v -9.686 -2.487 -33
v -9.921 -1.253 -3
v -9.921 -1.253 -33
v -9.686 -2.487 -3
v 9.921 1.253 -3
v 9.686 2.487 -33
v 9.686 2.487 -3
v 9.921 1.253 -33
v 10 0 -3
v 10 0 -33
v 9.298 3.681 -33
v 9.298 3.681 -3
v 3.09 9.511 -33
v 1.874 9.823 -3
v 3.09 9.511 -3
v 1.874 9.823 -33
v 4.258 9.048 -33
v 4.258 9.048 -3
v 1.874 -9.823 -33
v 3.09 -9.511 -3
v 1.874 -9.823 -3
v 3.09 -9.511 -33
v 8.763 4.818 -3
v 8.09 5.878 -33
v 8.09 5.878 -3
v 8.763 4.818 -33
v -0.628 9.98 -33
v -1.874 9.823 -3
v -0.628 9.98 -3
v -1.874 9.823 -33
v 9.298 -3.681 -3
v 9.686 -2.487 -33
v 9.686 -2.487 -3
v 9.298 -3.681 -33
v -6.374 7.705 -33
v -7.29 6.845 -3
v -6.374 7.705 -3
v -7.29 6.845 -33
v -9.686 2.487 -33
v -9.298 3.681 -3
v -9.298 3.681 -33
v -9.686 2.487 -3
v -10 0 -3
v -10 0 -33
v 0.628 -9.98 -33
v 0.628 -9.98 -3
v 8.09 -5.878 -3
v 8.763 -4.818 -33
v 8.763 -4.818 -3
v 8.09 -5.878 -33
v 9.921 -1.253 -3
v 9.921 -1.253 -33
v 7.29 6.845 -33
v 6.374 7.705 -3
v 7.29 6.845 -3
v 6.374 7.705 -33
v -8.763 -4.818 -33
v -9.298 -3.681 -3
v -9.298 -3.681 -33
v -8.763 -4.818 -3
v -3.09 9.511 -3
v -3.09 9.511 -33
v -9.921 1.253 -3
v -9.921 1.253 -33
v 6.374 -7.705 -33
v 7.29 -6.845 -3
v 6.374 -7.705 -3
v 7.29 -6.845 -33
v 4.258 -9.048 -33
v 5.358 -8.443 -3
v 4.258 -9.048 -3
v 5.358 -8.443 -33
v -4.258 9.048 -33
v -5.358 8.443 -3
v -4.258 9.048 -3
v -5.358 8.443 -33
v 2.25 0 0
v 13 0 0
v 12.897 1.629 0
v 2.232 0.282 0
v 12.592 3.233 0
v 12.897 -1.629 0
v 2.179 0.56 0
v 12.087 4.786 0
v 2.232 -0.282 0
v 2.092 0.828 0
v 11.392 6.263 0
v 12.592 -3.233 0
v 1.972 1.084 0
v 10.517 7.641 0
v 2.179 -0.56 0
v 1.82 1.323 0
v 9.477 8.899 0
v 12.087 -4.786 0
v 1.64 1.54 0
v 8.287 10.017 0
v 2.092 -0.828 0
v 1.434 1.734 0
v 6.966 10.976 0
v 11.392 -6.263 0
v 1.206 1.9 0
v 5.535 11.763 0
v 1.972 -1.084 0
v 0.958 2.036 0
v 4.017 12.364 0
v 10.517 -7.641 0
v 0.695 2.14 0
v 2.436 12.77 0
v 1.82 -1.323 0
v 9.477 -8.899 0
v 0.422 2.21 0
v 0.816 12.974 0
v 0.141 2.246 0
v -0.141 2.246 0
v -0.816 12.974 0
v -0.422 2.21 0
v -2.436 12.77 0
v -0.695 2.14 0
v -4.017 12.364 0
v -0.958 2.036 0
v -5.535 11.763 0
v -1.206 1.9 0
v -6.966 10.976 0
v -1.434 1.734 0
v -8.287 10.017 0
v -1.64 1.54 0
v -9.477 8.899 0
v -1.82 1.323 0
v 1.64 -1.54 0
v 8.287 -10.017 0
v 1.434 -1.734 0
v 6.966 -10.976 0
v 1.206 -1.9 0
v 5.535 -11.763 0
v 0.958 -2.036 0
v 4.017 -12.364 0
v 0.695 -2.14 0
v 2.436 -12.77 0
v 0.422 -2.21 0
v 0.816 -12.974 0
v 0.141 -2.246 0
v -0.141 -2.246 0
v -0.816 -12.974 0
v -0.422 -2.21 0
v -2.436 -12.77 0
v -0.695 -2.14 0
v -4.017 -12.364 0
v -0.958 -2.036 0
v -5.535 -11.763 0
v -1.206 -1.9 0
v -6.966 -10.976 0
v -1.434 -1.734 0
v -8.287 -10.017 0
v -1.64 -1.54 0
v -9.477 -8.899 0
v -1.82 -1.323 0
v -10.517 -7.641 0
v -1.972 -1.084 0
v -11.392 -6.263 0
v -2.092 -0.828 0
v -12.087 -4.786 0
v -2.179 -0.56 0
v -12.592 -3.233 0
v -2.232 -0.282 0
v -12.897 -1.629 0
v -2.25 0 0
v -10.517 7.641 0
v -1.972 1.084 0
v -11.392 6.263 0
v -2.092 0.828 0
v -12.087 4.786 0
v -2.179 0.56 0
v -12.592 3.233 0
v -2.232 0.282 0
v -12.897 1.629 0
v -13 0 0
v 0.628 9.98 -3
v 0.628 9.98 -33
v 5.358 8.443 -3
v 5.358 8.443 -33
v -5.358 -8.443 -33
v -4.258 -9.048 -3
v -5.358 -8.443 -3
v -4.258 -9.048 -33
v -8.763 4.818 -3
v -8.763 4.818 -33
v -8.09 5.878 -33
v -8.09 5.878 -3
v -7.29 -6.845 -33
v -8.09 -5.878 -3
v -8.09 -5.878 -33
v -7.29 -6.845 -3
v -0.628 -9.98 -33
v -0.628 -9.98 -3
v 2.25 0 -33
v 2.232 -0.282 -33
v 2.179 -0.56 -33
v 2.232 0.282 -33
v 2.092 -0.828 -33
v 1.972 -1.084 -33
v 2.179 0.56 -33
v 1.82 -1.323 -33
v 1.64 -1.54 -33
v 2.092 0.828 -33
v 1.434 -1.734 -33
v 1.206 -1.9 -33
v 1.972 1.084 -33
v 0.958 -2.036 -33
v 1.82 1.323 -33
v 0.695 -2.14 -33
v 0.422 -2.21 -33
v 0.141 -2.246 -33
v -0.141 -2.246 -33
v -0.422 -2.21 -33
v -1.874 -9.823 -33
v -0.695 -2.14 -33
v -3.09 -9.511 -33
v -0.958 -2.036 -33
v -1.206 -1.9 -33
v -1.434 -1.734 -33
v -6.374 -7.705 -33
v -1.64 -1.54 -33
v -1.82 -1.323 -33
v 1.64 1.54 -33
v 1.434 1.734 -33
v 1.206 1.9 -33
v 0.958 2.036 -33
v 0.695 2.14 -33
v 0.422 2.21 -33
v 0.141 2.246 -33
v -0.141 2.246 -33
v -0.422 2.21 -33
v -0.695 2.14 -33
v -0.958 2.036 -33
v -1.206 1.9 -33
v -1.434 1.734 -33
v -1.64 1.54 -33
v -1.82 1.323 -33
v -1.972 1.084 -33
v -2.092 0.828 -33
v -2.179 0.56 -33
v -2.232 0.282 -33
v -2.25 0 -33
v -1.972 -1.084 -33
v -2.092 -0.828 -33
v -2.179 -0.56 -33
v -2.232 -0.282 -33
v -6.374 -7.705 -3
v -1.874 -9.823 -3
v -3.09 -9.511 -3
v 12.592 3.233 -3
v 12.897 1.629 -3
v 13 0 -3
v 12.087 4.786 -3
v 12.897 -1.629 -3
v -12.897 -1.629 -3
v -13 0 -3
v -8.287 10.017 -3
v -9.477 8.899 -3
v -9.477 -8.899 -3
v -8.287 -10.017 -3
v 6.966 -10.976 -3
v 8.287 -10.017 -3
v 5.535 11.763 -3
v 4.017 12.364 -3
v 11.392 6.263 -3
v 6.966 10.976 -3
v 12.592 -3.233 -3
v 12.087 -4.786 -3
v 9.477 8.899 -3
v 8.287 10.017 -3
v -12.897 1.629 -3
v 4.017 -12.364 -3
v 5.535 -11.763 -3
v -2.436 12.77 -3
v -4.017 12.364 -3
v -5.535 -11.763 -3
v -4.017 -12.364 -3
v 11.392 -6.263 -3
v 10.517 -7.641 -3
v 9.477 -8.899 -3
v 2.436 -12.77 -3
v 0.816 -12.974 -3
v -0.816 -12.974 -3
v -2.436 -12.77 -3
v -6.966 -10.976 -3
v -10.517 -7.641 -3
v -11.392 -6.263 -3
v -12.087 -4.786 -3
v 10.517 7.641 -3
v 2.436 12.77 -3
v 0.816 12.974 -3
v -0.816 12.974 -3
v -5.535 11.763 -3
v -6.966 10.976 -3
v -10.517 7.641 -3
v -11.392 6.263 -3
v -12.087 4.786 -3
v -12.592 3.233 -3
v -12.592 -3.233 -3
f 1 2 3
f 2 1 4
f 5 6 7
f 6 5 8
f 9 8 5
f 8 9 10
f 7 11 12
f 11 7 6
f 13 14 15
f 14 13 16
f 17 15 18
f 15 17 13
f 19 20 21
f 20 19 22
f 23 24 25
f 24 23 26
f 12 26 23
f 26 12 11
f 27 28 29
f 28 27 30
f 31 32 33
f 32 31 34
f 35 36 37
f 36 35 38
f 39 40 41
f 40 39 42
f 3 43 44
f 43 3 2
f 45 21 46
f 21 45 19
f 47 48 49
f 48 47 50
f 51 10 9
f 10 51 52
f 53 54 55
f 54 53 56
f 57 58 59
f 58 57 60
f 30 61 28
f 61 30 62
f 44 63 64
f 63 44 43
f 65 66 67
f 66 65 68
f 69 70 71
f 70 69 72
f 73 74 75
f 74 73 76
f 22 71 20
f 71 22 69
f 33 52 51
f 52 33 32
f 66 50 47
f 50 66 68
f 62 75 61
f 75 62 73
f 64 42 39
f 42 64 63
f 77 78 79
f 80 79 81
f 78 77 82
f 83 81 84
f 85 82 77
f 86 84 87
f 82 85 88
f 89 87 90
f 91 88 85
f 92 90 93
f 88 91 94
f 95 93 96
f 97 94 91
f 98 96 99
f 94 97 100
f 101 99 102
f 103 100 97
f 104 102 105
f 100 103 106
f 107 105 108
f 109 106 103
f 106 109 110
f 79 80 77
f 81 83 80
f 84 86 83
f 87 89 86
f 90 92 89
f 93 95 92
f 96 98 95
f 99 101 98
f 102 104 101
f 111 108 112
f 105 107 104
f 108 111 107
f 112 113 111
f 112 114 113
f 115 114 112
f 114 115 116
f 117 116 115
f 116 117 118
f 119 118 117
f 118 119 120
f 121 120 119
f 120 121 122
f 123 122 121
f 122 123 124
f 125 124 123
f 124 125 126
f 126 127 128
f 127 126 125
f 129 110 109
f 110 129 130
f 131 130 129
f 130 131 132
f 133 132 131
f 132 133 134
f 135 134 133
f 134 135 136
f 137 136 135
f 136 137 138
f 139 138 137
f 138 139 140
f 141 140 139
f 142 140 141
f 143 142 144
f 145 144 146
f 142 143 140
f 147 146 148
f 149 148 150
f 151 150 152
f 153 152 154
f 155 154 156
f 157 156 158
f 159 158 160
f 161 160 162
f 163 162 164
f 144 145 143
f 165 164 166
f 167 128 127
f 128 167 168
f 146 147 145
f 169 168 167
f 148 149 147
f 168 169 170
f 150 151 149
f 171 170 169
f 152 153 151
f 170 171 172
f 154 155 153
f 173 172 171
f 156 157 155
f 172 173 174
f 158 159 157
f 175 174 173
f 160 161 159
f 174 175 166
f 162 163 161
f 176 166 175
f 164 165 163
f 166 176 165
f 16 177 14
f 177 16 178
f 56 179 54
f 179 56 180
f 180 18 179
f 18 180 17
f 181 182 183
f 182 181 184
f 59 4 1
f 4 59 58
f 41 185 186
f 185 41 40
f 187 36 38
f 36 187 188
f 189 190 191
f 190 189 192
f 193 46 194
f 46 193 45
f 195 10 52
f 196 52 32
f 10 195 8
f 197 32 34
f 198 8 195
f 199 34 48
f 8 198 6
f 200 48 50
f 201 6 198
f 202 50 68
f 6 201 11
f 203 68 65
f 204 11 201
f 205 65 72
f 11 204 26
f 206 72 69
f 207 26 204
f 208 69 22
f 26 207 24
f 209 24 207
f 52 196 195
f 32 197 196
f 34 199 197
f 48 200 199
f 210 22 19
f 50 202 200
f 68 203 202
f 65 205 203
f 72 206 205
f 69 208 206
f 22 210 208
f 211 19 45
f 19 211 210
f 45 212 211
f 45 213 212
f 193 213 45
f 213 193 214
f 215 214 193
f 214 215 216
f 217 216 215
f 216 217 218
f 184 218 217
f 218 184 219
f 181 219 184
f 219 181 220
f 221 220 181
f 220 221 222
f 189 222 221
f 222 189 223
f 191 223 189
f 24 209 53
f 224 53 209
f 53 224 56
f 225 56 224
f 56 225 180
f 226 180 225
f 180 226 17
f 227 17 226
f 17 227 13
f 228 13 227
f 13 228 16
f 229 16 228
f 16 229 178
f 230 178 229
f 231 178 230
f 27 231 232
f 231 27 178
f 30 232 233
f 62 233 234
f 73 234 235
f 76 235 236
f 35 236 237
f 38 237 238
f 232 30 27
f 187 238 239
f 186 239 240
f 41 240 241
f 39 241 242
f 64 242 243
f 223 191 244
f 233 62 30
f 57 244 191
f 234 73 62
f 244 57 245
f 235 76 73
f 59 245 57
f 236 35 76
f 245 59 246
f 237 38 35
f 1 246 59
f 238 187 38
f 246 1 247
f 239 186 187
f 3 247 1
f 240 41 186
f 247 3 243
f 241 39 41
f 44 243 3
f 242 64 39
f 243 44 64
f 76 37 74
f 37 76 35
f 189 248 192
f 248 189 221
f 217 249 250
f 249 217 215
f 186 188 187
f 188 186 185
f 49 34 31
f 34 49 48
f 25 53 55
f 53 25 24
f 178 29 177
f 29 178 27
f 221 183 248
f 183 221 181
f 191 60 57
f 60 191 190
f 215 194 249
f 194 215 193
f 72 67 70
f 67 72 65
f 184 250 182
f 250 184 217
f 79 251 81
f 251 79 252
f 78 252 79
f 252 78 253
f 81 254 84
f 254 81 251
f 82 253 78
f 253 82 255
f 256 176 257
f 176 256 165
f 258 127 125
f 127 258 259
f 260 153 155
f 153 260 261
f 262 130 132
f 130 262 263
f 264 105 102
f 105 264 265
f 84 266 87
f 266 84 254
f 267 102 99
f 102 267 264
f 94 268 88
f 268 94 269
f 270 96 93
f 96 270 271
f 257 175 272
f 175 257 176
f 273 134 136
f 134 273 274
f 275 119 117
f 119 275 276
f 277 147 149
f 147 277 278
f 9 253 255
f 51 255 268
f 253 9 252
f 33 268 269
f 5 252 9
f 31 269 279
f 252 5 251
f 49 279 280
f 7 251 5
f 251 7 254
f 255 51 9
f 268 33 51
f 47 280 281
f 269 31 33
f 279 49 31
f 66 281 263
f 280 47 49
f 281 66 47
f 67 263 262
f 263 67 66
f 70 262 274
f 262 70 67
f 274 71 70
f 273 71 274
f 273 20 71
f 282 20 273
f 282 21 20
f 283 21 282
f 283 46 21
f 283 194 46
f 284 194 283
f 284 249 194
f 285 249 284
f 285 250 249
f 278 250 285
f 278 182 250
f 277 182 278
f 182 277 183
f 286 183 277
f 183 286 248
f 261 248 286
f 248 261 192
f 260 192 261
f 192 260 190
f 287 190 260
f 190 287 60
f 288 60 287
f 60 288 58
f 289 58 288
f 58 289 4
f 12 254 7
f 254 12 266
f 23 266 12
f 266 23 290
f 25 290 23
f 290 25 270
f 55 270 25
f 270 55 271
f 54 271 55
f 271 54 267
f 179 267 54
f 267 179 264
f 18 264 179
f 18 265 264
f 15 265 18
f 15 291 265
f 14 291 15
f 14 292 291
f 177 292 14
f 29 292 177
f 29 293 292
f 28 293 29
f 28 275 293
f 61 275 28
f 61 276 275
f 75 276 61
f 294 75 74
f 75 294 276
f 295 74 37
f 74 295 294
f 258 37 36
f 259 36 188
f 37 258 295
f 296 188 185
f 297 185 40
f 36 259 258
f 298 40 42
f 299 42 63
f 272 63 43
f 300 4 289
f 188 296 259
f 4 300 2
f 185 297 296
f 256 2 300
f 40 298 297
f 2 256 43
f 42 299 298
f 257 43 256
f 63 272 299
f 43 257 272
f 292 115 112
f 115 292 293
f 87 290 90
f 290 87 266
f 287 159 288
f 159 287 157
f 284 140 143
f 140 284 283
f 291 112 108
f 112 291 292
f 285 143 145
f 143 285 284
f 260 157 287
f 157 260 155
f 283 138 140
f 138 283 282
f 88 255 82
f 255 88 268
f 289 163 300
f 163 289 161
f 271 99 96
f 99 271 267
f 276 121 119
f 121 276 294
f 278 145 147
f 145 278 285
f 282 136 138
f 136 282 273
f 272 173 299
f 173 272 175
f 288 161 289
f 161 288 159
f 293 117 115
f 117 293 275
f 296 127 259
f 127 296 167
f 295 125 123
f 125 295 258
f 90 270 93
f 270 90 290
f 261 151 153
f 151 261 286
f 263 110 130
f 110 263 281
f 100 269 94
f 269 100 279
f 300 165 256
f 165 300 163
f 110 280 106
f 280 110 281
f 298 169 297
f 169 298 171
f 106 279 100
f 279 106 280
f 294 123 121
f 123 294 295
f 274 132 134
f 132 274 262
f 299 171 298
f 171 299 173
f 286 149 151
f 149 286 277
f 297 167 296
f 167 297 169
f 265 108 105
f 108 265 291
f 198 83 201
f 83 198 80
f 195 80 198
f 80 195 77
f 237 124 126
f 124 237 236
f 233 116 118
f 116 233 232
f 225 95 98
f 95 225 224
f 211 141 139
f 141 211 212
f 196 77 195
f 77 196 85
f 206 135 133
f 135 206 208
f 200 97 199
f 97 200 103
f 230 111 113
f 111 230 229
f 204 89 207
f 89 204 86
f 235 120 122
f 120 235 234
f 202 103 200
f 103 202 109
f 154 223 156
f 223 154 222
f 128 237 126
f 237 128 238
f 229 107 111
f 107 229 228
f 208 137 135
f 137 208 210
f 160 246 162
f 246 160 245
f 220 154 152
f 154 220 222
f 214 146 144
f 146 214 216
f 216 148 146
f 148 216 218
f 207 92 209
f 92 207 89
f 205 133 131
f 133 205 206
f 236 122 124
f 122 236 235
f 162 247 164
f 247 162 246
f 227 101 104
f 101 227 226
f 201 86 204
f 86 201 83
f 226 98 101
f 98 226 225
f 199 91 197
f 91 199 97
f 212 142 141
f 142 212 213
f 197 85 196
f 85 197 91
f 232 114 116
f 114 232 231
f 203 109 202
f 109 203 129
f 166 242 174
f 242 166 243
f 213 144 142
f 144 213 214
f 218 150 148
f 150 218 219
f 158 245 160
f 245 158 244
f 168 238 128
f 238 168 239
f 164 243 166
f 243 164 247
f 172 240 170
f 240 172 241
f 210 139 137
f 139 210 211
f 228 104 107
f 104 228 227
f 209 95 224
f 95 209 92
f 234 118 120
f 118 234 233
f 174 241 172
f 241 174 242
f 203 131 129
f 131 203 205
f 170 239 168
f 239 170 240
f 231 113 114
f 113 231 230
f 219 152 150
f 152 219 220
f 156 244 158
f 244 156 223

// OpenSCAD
$fn = 50;


difference() {
	union() {
		translate(v = [0, 0, -33.0000000000]) {
			cylinder(h = 33, r = 10.0000000000);
		}
		translate(v = [0, 0, -3.0000000000]) {
			cylinder(h = 3, r = 13.0000000000);
		}
	}
	union() {
		#translate(v = [0, 0, -33]) {
			cylinder(h = 33, r = 2.2500000000);
		}
	}
}
